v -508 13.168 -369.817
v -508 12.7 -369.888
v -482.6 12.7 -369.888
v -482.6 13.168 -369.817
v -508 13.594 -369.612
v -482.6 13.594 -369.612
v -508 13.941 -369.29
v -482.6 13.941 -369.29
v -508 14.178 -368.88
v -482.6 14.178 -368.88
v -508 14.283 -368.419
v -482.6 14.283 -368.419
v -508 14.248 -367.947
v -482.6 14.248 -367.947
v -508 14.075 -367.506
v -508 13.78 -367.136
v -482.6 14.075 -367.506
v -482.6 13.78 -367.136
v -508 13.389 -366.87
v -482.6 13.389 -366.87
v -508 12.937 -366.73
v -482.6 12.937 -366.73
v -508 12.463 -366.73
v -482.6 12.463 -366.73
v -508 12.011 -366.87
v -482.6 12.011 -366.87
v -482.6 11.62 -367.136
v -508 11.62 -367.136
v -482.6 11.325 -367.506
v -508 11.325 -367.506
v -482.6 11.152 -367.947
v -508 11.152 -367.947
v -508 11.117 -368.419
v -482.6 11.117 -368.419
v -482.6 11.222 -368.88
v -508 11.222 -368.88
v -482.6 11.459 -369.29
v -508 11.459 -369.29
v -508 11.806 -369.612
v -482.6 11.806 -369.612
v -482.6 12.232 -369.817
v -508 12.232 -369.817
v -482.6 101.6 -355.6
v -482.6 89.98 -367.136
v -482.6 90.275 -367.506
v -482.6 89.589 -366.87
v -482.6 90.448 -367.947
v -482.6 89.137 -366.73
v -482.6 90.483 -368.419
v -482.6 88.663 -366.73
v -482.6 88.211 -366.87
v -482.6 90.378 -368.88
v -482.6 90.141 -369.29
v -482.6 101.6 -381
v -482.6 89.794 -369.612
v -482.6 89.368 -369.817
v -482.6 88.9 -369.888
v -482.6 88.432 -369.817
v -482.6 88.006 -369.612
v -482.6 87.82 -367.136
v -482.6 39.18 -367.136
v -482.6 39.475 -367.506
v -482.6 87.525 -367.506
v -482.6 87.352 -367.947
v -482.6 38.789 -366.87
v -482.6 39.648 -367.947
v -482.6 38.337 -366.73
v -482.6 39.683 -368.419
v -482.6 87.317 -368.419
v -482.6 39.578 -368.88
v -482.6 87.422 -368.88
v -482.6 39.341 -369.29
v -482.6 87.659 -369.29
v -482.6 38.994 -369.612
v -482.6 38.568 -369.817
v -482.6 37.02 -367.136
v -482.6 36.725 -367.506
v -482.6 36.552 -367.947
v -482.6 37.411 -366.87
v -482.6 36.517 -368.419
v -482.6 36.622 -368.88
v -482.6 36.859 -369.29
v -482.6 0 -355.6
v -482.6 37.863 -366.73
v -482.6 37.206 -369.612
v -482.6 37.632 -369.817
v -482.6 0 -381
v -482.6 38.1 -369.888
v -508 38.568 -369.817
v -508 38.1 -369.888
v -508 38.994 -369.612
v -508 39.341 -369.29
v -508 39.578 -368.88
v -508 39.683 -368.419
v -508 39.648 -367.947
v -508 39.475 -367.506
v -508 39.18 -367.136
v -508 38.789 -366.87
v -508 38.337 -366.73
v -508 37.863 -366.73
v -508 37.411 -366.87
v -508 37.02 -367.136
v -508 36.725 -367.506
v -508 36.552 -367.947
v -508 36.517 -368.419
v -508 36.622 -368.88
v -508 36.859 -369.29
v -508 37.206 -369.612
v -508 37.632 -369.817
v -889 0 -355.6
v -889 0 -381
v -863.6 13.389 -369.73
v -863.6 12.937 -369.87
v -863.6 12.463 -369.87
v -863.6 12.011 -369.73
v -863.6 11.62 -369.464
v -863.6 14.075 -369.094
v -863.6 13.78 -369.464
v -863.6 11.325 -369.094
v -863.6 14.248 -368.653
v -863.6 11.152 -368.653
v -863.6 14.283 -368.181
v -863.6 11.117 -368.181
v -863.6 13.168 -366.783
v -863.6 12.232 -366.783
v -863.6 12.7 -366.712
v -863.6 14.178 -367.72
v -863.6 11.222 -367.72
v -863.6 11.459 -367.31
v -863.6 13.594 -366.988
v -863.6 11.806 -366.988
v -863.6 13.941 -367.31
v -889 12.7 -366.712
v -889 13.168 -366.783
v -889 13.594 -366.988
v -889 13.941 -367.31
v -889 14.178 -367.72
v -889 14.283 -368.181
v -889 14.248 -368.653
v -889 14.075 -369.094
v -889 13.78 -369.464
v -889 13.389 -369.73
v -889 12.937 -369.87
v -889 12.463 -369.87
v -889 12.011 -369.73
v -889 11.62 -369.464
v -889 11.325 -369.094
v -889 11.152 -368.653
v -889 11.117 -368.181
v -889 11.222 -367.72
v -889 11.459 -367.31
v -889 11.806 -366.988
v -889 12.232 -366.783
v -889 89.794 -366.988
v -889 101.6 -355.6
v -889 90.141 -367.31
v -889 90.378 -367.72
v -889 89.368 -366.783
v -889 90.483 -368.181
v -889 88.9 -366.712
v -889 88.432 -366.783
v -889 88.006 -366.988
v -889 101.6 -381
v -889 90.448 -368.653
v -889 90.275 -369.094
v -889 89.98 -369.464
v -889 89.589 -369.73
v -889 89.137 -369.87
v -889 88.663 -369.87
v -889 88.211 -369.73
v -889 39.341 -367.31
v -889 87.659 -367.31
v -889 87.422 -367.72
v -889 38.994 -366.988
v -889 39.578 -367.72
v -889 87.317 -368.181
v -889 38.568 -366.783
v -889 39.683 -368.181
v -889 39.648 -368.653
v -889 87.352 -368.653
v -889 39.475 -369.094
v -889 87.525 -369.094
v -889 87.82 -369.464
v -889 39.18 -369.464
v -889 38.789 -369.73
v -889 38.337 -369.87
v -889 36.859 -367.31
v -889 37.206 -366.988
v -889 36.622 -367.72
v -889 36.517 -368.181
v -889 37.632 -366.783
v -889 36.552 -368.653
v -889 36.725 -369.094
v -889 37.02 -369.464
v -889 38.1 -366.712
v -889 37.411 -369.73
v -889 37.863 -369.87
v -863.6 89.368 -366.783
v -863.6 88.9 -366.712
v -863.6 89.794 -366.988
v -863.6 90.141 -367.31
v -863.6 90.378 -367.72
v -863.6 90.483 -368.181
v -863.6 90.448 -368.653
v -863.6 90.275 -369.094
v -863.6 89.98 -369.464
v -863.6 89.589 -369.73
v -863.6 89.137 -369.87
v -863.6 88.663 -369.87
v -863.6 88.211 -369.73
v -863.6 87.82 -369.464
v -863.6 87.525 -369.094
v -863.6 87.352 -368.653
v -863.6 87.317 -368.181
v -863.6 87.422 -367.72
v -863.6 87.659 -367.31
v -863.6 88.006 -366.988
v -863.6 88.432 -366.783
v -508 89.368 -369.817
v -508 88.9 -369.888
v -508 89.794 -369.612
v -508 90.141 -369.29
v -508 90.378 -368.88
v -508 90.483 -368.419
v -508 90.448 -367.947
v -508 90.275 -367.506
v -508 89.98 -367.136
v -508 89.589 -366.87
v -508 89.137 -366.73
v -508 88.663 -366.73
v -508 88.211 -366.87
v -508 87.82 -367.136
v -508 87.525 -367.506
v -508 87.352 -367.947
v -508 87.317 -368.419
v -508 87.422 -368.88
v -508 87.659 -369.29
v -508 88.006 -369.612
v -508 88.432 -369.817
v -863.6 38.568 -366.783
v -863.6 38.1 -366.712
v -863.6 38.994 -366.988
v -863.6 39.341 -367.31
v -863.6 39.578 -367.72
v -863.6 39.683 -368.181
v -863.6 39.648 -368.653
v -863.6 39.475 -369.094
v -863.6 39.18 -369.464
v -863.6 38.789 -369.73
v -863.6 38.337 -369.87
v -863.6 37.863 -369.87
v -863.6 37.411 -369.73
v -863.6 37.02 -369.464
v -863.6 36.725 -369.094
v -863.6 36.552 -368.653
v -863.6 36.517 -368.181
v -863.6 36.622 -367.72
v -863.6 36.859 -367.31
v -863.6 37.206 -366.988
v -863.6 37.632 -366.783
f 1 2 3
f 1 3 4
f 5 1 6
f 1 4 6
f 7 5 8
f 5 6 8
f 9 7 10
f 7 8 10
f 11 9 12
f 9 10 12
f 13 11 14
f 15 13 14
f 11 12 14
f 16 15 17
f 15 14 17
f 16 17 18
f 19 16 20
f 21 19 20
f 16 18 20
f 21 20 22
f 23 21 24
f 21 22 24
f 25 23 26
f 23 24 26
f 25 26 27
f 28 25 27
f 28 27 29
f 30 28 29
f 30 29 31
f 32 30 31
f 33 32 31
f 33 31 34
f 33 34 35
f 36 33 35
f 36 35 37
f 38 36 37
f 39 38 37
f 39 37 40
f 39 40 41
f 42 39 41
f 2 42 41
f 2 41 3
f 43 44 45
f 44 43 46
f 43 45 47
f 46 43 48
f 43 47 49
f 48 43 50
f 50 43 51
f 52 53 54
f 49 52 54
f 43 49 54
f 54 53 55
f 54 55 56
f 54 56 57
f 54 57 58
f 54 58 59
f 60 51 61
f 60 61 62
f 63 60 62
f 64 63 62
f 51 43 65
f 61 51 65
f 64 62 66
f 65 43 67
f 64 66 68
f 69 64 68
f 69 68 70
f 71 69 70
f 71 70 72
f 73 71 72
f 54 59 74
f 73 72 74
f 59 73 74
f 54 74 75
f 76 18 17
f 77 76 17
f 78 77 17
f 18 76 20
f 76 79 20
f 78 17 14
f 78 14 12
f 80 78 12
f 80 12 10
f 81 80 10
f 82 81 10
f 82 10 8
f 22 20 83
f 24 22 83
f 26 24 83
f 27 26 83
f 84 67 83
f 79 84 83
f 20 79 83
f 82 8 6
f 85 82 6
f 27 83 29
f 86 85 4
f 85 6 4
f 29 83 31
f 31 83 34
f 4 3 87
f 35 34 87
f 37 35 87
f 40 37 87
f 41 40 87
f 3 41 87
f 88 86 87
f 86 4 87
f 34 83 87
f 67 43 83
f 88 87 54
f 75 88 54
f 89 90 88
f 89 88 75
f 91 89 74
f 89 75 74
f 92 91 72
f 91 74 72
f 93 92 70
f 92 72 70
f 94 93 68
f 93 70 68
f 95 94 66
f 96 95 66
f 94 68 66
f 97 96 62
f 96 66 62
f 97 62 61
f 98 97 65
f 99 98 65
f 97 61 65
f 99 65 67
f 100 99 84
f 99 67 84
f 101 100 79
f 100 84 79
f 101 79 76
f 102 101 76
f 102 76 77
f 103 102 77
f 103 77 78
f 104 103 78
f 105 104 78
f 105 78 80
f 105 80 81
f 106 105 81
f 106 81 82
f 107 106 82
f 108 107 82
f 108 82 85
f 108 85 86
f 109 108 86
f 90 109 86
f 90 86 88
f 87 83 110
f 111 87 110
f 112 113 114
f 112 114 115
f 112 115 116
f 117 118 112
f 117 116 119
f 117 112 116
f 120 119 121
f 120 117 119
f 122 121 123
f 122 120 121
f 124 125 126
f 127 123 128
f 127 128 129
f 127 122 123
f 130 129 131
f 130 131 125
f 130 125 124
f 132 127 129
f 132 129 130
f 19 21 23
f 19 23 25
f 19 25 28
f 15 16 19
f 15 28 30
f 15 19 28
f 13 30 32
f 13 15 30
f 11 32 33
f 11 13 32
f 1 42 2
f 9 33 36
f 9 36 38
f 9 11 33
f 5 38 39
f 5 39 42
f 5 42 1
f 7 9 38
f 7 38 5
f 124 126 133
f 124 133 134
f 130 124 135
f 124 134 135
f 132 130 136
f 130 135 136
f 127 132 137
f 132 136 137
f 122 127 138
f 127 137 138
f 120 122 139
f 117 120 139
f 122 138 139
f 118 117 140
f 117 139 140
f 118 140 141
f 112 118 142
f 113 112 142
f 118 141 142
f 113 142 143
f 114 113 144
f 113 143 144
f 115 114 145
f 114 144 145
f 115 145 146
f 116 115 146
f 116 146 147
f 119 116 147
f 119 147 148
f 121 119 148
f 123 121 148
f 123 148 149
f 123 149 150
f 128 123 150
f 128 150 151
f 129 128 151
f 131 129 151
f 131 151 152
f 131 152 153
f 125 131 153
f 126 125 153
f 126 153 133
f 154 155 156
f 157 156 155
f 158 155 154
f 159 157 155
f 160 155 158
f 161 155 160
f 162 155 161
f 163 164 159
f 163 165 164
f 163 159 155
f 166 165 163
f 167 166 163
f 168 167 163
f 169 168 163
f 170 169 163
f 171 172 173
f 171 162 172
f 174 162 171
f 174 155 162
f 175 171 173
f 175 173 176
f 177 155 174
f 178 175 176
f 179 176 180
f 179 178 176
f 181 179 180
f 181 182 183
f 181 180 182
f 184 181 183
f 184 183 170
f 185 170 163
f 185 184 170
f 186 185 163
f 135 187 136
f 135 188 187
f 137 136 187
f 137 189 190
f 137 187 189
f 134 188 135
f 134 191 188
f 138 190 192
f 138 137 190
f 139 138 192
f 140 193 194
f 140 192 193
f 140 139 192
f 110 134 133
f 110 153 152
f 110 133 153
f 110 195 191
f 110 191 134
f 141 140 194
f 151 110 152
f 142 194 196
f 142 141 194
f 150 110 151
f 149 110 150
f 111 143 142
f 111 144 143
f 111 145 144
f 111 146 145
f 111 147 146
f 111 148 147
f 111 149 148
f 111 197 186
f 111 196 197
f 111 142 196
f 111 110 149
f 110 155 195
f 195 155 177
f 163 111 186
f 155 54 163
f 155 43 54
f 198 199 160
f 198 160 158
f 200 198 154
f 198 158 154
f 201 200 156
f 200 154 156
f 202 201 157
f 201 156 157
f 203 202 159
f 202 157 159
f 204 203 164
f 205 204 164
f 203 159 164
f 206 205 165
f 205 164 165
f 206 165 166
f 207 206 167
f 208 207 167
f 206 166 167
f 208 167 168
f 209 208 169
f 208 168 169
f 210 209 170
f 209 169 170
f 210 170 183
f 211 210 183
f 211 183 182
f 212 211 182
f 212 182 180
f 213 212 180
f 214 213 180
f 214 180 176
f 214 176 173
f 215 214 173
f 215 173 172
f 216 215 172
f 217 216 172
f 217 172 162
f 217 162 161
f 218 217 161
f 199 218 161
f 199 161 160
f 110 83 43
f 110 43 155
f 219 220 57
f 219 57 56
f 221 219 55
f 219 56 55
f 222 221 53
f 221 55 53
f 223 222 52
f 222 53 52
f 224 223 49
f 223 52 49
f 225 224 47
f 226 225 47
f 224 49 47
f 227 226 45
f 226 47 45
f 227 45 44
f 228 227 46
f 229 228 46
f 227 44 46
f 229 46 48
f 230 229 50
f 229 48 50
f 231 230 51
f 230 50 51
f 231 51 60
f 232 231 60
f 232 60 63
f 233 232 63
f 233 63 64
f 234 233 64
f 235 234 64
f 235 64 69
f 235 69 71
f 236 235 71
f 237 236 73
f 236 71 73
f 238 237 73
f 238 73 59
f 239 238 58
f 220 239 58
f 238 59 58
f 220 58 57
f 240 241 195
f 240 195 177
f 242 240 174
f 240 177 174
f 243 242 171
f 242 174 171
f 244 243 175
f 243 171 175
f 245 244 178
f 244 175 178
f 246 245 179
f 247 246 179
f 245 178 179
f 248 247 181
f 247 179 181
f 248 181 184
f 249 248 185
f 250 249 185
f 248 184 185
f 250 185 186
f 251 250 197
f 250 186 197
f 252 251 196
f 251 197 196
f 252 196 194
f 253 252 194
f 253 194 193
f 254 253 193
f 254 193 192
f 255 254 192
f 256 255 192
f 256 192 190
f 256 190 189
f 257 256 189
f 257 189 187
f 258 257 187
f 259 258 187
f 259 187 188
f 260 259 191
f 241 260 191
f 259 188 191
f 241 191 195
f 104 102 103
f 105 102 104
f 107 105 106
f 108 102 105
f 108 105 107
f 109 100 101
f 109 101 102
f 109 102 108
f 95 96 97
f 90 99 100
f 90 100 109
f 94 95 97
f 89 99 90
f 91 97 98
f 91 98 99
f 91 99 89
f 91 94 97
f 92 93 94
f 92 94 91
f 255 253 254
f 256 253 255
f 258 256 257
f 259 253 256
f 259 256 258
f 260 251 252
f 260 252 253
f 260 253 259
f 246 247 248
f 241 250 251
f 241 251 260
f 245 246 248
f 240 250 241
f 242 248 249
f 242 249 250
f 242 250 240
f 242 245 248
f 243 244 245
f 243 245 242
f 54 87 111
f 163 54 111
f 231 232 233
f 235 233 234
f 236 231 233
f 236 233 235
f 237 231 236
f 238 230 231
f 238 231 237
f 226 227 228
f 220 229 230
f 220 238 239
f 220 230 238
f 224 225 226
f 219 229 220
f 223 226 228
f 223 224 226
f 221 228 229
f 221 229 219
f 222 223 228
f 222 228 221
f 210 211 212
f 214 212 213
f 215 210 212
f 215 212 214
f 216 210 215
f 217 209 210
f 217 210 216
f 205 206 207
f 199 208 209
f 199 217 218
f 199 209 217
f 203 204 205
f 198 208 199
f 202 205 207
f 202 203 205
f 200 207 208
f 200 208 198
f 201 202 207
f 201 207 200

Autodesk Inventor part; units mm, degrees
ref_plane "YZ Plane" through (0, 0, 0) normal (1, 0, 0) x (0, 1, 0)
ref_plane "XZ Plane" through (0, 0, 0) normal (0, 1, 0) x (-1, 0, 0)
ref_plane "XY Plane" through (0, 0, 0) normal (0, 0, 1) x (1, 0, 0)
sketch "Sketch1" plane through (0, 0, 0) normal (0, 1, 0) x (-1, 0, 0)
  line L0 (6.35, 0) -> (1365.25, 0)
  line L1 (1371.6, -6.35) -> (1371.6, -1365.25)
  line L2 (1365.25, -1371.6) -> (6.35, -1371.6)
  line L3 (0, -1365.25) -> (0, -6.35)
  line L4 (1346.2, -1346.2) -> (1346.2, -25.4)
  line L5 (1346.2, -25.4) -> (25.4, -25.4)
  line L6 (25.4, -25.4) -> (25.4, -1346.2)
  line L7 (25.4, -1346.2) -> (1346.2, -1346.2)
  line L8 (1320.8, -50.8) -> (1320.8, -1320.8)
  line L9 (1320.8, -1320.8) -> (50.8, -1320.8)
  line L10 (50.8, -1320.8) -> (50.8, -50.8)
  line L11 (50.8, -50.8) -> (1320.8, -50.8)
  line L12 (1320.8, -50.8) -> (1346.2, -25.4)
  line L13 (1320.8, -1320.8) -> (1346.2, -1346.2)
  line L14 (50.8, -1320.8) -> (25.4, -1346.2)
  line L15 (50.8, -50.8) -> (25.4, -25.4)
  line L16 (1219.2, -482.6) -> (1016, -482.6)
  line L17 (1016, -482.6) -> (1016, -889)
  line L18 (1016, -889) -> (1219.2, -889)
  line L19 (1219.2, -889) -> (1219.2, -482.6)
  line L20 (355.6, -482.6) -> (152.4, -482.6)
  line L21 (152.4, -482.6) -> (152.4, -889)
  line L22 (152.4, -889) -> (355.6, -889)
  line L23 (355.6, -889) -> (355.6, -482.6)
  line L24 (889, -1016) -> (482.6, -1016)
  line L25 (482.6, -1016) -> (482.6, -1219.2)
  line L26 (482.6, -1219.2) -> (889, -1219.2)
  line L27 (889, -1219.2) -> (889, -1016)
  line L28 (889, -152.4) -> (482.6, -152.4)
  line L29 (482.6, -152.4) -> (482.6, -355.6)
  line L30 (482.6, -355.6) -> (889, -355.6)
  line L31 (889, -355.6) -> (889, -152.4)
  circle A0 centre (685.8, -685.8) radius 254
  line L32 (889, -127) -> (482.6, -127)
  line L33 (457.2, -127) -> (457.2, -381)
  line L34 (457.2, -381) -> (914.4, -381)
  line L35 (914.4, -381) -> (914.4, -127)
  line L36 (1244.6, -457.2) -> (990.6, -457.2)
  line L37 (990.6, -457.2) -> (990.6, -914.4)
  line L38 (990.6, -914.4) -> (1244.6, -914.4)
  line L39 (1244.6, -889) -> (1244.6, -482.6)
  line L40 (914.4, -990.6) -> (457.2, -990.6)
  line L41 (457.2, -990.6) -> (457.2, -1244.6)
  line L42 (482.6, -1244.6) -> (889, -1244.6)
  line L43 (914.4, -1244.6) -> (914.4, -990.6)
  line L44 (381, -457.2) -> (127, -457.2)
  line L45 (127, -482.6) -> (127, -889)
  line L46 (127, -914.4) -> (381, -914.4)
  line L47 (381, -914.4) -> (381, -457.2)
  line L48 (152.4, -482.6) -> (50.8, -482.6)
  line L49 (127, -457.2) -> (50.8, -457.2)
  line L50 (152.4, -889) -> (50.8, -889)
  line L51 (127, -914.4) -> (50.8, -914.4)
  line L52 (355.6, -889) -> (381, -889)
  line L53 (355.6, -482.6) -> (381, -482.6)
  line L54 (457.2, -1244.6) -> (457.2, -1320.8)
  line L55 (482.6, -1219.2) -> (482.6, -1320.8)
  line L56 (889, -1219.2) -> (889, -1320.8)
  line L57 (914.4, -1244.6) -> (914.4, -1320.8)
  line L58 (1244.6, -914.4) -> (1320.8, -914.4)
  line L59 (1219.2, -889) -> (1320.8, -889)
  line L60 (1219.2, -482.6) -> (1320.8, -482.6)
  line L61 (1244.6, -457.2) -> (1320.8, -457.2)
  line L62 (889, -152.4) -> (889, -50.8)
  line L63 (914.4, -127) -> (914.4, -50.8)
  line L64 (482.6, -152.4) -> (482.6, -50.8)
  line L65 (457.2, -127) -> (457.2, -50.8)
  line L66 (889, -1016) -> (889, -990.6)
  line L67 (482.6, -1016) -> (482.6, -990.6)
  line L68 (1016, -889) -> (990.6, -889)
  line L69 (1016, -482.6) -> (990.6, -482.6)
  line L70 (889, -355.6) -> (889, -381)
  line L71 (482.6, -355.6) -> (482.6, -381)
  line L72 (914.4, -381) -> (990.6, -457.2)
  line L73 (990.6, -482.6) -> (889, -381)
  line L74 (990.6, -914.4) -> (914.4, -990.6)
  line L75 (889, -990.6) -> (990.6, -889)
  line L76 (381, -914.4) -> (457.2, -990.6)
  line L77 (482.6, -990.6) -> (381, -889)
  line L78 (457.2, -381) -> (381, -457.2)
  line L79 (482.6, -381) -> (381, -482.6)
  line L80 (1257.3, -50.8) -> (1320.8, -114.3)
  line L81 (1320.8, -1257.3) -> (1257.3, -1320.8)
  line L82 (50.8, -1257.3) -> (114.3, -1320.8)
  line L83 (50.8, -114.3) -> (114.3, -50.8)
  line L84 (68.7605, -132.2605) -> (132.2605, -68.7605)
  line L85 (68.7605, -1239.3395) -> (132.2605, -1302.8395)
  line L86 (1302.8395, -1239.3395) -> (1239.3395, -1302.8395)
  line L87 (1239.3395, -68.7605) -> (1302.8395, -132.2605)
  line L88 (1302.8395, -132.2605) -> (1320.8, -150.221)
  line L89 (1239.3395, -68.7605) -> (1221.379, -50.8)
  line L90 (1302.8395, -1239.3395) -> (1320.8, -1221.379)
  line L91 (1239.3395, -1302.8395) -> (1221.379, -1320.8)
  line L92 (132.2605, -1302.8395) -> (150.221, -1320.8)
  line L93 (68.7605, -1239.3395) -> (50.8, -1221.379)
  line L94 (132.2605, -68.7605) -> (150.221, -50.8)
  line L95 (68.7605, -132.2605) -> (50.8, -150.221)
  line L96 (1365.25, 0) -> (1371.6, -6.35)
  line L97 (1371.6, -1365.25) -> (1365.25, -1371.6)
  line L98 (6.35, -1371.6) -> (0, -1365.25)
  line L99 (6.35, 0) -> (0, -6.35)
  point P0 (0, 0)
  point P1 (1371.6, -1371.6)
  point P2 (1371.6, 0)
  point P3 (0, -1371.6)
  dimension "d0" = 1371.6
  dimension "d1" = 1371.6
  dimension "d2" = 25.4
  dimension "d3" = 25.4
  dimension "d4" = 203.2
  dimension "d5" = 406.4
  dimension "d6" = 203.2
  dimension "d7" = 406.4
  dimension "d8" = 406.4
  dimension "d9" = 203.2
  dimension "d10" = 406.4
  dimension "d11" = 203.2
  dimension "d12" = 101.6
  dimension "d13" = 101.6
  dimension "d14" = 101.6
  dimension "d15" = 101.6
  dimension "d16" = 431.8
  dimension "d17" = 431.8
  dimension "d18" = 431.8
  dimension "d19" = 431.8
  dimension "d20" = 508
  dimension "d21" = 25.4
  dimension "d22" = 25.4
  dimension "d23" = 25.4
  dimension "d24" = 25.4
  dimension "d25" = 45
  dimension "d26" = 63.5
  dimension "d27" = 45
  dimension "d28" = 45
  dimension "d29" = 45
  dimension "d30" = 25.4
  dimension "d31" = 25.4
  dimension "d32" = 25.4
  dimension "d33" = 25.4
  dimension "d34" = 6.35
  dimension "d35" = 6.35
  dimension "d36" = 6.35
  dimension "d37" = 6.35
  dimension "d38" = 6.35
  dimension "d39" = 6.35
  dimension "d40" = 6.35
  dimension "d41" = 6.35
extrude "Extrusion1" add sketch "Sketch1" along normal blind 101.6 contours L34 L71 L30 L70
sketch "Sketch2" plane through (-482.6, 0, -355.6) normal (1, 0, 0) x (0, 0, -1)
  circle A0 centre (12.7, 88.9) radius 1.5875
  circle A1 centre (12.7, 38.1) radius 1.5875
  line L0 (0, 0) -> (0, 101.6) projected
  line L1 (0, 101.6) -> (25.4, 101.6) projected
  point P0 (-355.6, 0)
  dimension "d44" = 3.175
  dimension "d45" = 3.175
  dimension "d46" = 12.7
  dimension "d47" = 12.7
  dimension "d48" = 12.7
  dimension "d49" = 63.5
extrude "Extrusion2" cut sketch "Sketch2" against normal blind 25.4
sketch "Sketch3" plane through (-889, 0, -381) normal (-1, 0, 0) x (0, 0, 1)
  circle A0 centre (12.7, 88.9) radius 1.5875
  circle A1 centre (12.7, 38.1) radius 1.5875
  line L0 (0, 101.6) -> (25.4, 101.6) projected
  line L1 (0, 0) -> (0, 101.6) projected
  point P0 (381, 0)
  dimension "d52" = 3.175
  dimension "d53" = 3.175
  dimension "d54" = 12.7
  dimension "d55" = 12.7
  dimension "d56" = 12.7
  dimension "d57" = 63.5
extrude "Extrusion3" cut sketch "Sketch3" against normal blind 25.4
sketch "Sketch4" plane through (-482.6, 0, -355.6) normal (1, 0, 0) x (0, 0, -1)
  circle A0 centre (12.7, 12.7) radius 1.5875
  line L0 (25.4, 0) -> (25.4, 101.6) projected
  line L1 (0, 0) -> (25.4, 0) projected
  point P0 (-355.6, 0)
  point P1 (12.7, 0)
  dimension "d60" = 3.175
  dimension "d61" = 12.7
  dimension "d62" = 12.7
extrude "Extrusion4" cut sketch "Sketch4" against normal blind 25.4
sketch "Sketch5" plane through (-889, 0, -381) normal (-1, 0, 0) x (0, 0, 1)
  circle A0 centre (12.7, 12.7) radius 1.5875
  line L0 (0, 0) -> (0, 101.6) projected
  line L1 (0, 0) -> (25.4, 0) projected
  point P0 (381, 0)
  dimension "d65" = 3.175
  dimension "d66" = 12.7
  dimension "d67" = 12.7
extrude "Extrusion5" cut sketch "Sketch5" against normal blind 25.4
equation "\"d35\" = d34"
equation "\"d36\" = d34"
equation "\"d37\" = d36"
equation "\"d38\" = d34"
equation "\"d39\" = d38"
equation "\"d40\" = d34"
equation "\"d41\" = d40"
properties part number "Tall drawn wall"
